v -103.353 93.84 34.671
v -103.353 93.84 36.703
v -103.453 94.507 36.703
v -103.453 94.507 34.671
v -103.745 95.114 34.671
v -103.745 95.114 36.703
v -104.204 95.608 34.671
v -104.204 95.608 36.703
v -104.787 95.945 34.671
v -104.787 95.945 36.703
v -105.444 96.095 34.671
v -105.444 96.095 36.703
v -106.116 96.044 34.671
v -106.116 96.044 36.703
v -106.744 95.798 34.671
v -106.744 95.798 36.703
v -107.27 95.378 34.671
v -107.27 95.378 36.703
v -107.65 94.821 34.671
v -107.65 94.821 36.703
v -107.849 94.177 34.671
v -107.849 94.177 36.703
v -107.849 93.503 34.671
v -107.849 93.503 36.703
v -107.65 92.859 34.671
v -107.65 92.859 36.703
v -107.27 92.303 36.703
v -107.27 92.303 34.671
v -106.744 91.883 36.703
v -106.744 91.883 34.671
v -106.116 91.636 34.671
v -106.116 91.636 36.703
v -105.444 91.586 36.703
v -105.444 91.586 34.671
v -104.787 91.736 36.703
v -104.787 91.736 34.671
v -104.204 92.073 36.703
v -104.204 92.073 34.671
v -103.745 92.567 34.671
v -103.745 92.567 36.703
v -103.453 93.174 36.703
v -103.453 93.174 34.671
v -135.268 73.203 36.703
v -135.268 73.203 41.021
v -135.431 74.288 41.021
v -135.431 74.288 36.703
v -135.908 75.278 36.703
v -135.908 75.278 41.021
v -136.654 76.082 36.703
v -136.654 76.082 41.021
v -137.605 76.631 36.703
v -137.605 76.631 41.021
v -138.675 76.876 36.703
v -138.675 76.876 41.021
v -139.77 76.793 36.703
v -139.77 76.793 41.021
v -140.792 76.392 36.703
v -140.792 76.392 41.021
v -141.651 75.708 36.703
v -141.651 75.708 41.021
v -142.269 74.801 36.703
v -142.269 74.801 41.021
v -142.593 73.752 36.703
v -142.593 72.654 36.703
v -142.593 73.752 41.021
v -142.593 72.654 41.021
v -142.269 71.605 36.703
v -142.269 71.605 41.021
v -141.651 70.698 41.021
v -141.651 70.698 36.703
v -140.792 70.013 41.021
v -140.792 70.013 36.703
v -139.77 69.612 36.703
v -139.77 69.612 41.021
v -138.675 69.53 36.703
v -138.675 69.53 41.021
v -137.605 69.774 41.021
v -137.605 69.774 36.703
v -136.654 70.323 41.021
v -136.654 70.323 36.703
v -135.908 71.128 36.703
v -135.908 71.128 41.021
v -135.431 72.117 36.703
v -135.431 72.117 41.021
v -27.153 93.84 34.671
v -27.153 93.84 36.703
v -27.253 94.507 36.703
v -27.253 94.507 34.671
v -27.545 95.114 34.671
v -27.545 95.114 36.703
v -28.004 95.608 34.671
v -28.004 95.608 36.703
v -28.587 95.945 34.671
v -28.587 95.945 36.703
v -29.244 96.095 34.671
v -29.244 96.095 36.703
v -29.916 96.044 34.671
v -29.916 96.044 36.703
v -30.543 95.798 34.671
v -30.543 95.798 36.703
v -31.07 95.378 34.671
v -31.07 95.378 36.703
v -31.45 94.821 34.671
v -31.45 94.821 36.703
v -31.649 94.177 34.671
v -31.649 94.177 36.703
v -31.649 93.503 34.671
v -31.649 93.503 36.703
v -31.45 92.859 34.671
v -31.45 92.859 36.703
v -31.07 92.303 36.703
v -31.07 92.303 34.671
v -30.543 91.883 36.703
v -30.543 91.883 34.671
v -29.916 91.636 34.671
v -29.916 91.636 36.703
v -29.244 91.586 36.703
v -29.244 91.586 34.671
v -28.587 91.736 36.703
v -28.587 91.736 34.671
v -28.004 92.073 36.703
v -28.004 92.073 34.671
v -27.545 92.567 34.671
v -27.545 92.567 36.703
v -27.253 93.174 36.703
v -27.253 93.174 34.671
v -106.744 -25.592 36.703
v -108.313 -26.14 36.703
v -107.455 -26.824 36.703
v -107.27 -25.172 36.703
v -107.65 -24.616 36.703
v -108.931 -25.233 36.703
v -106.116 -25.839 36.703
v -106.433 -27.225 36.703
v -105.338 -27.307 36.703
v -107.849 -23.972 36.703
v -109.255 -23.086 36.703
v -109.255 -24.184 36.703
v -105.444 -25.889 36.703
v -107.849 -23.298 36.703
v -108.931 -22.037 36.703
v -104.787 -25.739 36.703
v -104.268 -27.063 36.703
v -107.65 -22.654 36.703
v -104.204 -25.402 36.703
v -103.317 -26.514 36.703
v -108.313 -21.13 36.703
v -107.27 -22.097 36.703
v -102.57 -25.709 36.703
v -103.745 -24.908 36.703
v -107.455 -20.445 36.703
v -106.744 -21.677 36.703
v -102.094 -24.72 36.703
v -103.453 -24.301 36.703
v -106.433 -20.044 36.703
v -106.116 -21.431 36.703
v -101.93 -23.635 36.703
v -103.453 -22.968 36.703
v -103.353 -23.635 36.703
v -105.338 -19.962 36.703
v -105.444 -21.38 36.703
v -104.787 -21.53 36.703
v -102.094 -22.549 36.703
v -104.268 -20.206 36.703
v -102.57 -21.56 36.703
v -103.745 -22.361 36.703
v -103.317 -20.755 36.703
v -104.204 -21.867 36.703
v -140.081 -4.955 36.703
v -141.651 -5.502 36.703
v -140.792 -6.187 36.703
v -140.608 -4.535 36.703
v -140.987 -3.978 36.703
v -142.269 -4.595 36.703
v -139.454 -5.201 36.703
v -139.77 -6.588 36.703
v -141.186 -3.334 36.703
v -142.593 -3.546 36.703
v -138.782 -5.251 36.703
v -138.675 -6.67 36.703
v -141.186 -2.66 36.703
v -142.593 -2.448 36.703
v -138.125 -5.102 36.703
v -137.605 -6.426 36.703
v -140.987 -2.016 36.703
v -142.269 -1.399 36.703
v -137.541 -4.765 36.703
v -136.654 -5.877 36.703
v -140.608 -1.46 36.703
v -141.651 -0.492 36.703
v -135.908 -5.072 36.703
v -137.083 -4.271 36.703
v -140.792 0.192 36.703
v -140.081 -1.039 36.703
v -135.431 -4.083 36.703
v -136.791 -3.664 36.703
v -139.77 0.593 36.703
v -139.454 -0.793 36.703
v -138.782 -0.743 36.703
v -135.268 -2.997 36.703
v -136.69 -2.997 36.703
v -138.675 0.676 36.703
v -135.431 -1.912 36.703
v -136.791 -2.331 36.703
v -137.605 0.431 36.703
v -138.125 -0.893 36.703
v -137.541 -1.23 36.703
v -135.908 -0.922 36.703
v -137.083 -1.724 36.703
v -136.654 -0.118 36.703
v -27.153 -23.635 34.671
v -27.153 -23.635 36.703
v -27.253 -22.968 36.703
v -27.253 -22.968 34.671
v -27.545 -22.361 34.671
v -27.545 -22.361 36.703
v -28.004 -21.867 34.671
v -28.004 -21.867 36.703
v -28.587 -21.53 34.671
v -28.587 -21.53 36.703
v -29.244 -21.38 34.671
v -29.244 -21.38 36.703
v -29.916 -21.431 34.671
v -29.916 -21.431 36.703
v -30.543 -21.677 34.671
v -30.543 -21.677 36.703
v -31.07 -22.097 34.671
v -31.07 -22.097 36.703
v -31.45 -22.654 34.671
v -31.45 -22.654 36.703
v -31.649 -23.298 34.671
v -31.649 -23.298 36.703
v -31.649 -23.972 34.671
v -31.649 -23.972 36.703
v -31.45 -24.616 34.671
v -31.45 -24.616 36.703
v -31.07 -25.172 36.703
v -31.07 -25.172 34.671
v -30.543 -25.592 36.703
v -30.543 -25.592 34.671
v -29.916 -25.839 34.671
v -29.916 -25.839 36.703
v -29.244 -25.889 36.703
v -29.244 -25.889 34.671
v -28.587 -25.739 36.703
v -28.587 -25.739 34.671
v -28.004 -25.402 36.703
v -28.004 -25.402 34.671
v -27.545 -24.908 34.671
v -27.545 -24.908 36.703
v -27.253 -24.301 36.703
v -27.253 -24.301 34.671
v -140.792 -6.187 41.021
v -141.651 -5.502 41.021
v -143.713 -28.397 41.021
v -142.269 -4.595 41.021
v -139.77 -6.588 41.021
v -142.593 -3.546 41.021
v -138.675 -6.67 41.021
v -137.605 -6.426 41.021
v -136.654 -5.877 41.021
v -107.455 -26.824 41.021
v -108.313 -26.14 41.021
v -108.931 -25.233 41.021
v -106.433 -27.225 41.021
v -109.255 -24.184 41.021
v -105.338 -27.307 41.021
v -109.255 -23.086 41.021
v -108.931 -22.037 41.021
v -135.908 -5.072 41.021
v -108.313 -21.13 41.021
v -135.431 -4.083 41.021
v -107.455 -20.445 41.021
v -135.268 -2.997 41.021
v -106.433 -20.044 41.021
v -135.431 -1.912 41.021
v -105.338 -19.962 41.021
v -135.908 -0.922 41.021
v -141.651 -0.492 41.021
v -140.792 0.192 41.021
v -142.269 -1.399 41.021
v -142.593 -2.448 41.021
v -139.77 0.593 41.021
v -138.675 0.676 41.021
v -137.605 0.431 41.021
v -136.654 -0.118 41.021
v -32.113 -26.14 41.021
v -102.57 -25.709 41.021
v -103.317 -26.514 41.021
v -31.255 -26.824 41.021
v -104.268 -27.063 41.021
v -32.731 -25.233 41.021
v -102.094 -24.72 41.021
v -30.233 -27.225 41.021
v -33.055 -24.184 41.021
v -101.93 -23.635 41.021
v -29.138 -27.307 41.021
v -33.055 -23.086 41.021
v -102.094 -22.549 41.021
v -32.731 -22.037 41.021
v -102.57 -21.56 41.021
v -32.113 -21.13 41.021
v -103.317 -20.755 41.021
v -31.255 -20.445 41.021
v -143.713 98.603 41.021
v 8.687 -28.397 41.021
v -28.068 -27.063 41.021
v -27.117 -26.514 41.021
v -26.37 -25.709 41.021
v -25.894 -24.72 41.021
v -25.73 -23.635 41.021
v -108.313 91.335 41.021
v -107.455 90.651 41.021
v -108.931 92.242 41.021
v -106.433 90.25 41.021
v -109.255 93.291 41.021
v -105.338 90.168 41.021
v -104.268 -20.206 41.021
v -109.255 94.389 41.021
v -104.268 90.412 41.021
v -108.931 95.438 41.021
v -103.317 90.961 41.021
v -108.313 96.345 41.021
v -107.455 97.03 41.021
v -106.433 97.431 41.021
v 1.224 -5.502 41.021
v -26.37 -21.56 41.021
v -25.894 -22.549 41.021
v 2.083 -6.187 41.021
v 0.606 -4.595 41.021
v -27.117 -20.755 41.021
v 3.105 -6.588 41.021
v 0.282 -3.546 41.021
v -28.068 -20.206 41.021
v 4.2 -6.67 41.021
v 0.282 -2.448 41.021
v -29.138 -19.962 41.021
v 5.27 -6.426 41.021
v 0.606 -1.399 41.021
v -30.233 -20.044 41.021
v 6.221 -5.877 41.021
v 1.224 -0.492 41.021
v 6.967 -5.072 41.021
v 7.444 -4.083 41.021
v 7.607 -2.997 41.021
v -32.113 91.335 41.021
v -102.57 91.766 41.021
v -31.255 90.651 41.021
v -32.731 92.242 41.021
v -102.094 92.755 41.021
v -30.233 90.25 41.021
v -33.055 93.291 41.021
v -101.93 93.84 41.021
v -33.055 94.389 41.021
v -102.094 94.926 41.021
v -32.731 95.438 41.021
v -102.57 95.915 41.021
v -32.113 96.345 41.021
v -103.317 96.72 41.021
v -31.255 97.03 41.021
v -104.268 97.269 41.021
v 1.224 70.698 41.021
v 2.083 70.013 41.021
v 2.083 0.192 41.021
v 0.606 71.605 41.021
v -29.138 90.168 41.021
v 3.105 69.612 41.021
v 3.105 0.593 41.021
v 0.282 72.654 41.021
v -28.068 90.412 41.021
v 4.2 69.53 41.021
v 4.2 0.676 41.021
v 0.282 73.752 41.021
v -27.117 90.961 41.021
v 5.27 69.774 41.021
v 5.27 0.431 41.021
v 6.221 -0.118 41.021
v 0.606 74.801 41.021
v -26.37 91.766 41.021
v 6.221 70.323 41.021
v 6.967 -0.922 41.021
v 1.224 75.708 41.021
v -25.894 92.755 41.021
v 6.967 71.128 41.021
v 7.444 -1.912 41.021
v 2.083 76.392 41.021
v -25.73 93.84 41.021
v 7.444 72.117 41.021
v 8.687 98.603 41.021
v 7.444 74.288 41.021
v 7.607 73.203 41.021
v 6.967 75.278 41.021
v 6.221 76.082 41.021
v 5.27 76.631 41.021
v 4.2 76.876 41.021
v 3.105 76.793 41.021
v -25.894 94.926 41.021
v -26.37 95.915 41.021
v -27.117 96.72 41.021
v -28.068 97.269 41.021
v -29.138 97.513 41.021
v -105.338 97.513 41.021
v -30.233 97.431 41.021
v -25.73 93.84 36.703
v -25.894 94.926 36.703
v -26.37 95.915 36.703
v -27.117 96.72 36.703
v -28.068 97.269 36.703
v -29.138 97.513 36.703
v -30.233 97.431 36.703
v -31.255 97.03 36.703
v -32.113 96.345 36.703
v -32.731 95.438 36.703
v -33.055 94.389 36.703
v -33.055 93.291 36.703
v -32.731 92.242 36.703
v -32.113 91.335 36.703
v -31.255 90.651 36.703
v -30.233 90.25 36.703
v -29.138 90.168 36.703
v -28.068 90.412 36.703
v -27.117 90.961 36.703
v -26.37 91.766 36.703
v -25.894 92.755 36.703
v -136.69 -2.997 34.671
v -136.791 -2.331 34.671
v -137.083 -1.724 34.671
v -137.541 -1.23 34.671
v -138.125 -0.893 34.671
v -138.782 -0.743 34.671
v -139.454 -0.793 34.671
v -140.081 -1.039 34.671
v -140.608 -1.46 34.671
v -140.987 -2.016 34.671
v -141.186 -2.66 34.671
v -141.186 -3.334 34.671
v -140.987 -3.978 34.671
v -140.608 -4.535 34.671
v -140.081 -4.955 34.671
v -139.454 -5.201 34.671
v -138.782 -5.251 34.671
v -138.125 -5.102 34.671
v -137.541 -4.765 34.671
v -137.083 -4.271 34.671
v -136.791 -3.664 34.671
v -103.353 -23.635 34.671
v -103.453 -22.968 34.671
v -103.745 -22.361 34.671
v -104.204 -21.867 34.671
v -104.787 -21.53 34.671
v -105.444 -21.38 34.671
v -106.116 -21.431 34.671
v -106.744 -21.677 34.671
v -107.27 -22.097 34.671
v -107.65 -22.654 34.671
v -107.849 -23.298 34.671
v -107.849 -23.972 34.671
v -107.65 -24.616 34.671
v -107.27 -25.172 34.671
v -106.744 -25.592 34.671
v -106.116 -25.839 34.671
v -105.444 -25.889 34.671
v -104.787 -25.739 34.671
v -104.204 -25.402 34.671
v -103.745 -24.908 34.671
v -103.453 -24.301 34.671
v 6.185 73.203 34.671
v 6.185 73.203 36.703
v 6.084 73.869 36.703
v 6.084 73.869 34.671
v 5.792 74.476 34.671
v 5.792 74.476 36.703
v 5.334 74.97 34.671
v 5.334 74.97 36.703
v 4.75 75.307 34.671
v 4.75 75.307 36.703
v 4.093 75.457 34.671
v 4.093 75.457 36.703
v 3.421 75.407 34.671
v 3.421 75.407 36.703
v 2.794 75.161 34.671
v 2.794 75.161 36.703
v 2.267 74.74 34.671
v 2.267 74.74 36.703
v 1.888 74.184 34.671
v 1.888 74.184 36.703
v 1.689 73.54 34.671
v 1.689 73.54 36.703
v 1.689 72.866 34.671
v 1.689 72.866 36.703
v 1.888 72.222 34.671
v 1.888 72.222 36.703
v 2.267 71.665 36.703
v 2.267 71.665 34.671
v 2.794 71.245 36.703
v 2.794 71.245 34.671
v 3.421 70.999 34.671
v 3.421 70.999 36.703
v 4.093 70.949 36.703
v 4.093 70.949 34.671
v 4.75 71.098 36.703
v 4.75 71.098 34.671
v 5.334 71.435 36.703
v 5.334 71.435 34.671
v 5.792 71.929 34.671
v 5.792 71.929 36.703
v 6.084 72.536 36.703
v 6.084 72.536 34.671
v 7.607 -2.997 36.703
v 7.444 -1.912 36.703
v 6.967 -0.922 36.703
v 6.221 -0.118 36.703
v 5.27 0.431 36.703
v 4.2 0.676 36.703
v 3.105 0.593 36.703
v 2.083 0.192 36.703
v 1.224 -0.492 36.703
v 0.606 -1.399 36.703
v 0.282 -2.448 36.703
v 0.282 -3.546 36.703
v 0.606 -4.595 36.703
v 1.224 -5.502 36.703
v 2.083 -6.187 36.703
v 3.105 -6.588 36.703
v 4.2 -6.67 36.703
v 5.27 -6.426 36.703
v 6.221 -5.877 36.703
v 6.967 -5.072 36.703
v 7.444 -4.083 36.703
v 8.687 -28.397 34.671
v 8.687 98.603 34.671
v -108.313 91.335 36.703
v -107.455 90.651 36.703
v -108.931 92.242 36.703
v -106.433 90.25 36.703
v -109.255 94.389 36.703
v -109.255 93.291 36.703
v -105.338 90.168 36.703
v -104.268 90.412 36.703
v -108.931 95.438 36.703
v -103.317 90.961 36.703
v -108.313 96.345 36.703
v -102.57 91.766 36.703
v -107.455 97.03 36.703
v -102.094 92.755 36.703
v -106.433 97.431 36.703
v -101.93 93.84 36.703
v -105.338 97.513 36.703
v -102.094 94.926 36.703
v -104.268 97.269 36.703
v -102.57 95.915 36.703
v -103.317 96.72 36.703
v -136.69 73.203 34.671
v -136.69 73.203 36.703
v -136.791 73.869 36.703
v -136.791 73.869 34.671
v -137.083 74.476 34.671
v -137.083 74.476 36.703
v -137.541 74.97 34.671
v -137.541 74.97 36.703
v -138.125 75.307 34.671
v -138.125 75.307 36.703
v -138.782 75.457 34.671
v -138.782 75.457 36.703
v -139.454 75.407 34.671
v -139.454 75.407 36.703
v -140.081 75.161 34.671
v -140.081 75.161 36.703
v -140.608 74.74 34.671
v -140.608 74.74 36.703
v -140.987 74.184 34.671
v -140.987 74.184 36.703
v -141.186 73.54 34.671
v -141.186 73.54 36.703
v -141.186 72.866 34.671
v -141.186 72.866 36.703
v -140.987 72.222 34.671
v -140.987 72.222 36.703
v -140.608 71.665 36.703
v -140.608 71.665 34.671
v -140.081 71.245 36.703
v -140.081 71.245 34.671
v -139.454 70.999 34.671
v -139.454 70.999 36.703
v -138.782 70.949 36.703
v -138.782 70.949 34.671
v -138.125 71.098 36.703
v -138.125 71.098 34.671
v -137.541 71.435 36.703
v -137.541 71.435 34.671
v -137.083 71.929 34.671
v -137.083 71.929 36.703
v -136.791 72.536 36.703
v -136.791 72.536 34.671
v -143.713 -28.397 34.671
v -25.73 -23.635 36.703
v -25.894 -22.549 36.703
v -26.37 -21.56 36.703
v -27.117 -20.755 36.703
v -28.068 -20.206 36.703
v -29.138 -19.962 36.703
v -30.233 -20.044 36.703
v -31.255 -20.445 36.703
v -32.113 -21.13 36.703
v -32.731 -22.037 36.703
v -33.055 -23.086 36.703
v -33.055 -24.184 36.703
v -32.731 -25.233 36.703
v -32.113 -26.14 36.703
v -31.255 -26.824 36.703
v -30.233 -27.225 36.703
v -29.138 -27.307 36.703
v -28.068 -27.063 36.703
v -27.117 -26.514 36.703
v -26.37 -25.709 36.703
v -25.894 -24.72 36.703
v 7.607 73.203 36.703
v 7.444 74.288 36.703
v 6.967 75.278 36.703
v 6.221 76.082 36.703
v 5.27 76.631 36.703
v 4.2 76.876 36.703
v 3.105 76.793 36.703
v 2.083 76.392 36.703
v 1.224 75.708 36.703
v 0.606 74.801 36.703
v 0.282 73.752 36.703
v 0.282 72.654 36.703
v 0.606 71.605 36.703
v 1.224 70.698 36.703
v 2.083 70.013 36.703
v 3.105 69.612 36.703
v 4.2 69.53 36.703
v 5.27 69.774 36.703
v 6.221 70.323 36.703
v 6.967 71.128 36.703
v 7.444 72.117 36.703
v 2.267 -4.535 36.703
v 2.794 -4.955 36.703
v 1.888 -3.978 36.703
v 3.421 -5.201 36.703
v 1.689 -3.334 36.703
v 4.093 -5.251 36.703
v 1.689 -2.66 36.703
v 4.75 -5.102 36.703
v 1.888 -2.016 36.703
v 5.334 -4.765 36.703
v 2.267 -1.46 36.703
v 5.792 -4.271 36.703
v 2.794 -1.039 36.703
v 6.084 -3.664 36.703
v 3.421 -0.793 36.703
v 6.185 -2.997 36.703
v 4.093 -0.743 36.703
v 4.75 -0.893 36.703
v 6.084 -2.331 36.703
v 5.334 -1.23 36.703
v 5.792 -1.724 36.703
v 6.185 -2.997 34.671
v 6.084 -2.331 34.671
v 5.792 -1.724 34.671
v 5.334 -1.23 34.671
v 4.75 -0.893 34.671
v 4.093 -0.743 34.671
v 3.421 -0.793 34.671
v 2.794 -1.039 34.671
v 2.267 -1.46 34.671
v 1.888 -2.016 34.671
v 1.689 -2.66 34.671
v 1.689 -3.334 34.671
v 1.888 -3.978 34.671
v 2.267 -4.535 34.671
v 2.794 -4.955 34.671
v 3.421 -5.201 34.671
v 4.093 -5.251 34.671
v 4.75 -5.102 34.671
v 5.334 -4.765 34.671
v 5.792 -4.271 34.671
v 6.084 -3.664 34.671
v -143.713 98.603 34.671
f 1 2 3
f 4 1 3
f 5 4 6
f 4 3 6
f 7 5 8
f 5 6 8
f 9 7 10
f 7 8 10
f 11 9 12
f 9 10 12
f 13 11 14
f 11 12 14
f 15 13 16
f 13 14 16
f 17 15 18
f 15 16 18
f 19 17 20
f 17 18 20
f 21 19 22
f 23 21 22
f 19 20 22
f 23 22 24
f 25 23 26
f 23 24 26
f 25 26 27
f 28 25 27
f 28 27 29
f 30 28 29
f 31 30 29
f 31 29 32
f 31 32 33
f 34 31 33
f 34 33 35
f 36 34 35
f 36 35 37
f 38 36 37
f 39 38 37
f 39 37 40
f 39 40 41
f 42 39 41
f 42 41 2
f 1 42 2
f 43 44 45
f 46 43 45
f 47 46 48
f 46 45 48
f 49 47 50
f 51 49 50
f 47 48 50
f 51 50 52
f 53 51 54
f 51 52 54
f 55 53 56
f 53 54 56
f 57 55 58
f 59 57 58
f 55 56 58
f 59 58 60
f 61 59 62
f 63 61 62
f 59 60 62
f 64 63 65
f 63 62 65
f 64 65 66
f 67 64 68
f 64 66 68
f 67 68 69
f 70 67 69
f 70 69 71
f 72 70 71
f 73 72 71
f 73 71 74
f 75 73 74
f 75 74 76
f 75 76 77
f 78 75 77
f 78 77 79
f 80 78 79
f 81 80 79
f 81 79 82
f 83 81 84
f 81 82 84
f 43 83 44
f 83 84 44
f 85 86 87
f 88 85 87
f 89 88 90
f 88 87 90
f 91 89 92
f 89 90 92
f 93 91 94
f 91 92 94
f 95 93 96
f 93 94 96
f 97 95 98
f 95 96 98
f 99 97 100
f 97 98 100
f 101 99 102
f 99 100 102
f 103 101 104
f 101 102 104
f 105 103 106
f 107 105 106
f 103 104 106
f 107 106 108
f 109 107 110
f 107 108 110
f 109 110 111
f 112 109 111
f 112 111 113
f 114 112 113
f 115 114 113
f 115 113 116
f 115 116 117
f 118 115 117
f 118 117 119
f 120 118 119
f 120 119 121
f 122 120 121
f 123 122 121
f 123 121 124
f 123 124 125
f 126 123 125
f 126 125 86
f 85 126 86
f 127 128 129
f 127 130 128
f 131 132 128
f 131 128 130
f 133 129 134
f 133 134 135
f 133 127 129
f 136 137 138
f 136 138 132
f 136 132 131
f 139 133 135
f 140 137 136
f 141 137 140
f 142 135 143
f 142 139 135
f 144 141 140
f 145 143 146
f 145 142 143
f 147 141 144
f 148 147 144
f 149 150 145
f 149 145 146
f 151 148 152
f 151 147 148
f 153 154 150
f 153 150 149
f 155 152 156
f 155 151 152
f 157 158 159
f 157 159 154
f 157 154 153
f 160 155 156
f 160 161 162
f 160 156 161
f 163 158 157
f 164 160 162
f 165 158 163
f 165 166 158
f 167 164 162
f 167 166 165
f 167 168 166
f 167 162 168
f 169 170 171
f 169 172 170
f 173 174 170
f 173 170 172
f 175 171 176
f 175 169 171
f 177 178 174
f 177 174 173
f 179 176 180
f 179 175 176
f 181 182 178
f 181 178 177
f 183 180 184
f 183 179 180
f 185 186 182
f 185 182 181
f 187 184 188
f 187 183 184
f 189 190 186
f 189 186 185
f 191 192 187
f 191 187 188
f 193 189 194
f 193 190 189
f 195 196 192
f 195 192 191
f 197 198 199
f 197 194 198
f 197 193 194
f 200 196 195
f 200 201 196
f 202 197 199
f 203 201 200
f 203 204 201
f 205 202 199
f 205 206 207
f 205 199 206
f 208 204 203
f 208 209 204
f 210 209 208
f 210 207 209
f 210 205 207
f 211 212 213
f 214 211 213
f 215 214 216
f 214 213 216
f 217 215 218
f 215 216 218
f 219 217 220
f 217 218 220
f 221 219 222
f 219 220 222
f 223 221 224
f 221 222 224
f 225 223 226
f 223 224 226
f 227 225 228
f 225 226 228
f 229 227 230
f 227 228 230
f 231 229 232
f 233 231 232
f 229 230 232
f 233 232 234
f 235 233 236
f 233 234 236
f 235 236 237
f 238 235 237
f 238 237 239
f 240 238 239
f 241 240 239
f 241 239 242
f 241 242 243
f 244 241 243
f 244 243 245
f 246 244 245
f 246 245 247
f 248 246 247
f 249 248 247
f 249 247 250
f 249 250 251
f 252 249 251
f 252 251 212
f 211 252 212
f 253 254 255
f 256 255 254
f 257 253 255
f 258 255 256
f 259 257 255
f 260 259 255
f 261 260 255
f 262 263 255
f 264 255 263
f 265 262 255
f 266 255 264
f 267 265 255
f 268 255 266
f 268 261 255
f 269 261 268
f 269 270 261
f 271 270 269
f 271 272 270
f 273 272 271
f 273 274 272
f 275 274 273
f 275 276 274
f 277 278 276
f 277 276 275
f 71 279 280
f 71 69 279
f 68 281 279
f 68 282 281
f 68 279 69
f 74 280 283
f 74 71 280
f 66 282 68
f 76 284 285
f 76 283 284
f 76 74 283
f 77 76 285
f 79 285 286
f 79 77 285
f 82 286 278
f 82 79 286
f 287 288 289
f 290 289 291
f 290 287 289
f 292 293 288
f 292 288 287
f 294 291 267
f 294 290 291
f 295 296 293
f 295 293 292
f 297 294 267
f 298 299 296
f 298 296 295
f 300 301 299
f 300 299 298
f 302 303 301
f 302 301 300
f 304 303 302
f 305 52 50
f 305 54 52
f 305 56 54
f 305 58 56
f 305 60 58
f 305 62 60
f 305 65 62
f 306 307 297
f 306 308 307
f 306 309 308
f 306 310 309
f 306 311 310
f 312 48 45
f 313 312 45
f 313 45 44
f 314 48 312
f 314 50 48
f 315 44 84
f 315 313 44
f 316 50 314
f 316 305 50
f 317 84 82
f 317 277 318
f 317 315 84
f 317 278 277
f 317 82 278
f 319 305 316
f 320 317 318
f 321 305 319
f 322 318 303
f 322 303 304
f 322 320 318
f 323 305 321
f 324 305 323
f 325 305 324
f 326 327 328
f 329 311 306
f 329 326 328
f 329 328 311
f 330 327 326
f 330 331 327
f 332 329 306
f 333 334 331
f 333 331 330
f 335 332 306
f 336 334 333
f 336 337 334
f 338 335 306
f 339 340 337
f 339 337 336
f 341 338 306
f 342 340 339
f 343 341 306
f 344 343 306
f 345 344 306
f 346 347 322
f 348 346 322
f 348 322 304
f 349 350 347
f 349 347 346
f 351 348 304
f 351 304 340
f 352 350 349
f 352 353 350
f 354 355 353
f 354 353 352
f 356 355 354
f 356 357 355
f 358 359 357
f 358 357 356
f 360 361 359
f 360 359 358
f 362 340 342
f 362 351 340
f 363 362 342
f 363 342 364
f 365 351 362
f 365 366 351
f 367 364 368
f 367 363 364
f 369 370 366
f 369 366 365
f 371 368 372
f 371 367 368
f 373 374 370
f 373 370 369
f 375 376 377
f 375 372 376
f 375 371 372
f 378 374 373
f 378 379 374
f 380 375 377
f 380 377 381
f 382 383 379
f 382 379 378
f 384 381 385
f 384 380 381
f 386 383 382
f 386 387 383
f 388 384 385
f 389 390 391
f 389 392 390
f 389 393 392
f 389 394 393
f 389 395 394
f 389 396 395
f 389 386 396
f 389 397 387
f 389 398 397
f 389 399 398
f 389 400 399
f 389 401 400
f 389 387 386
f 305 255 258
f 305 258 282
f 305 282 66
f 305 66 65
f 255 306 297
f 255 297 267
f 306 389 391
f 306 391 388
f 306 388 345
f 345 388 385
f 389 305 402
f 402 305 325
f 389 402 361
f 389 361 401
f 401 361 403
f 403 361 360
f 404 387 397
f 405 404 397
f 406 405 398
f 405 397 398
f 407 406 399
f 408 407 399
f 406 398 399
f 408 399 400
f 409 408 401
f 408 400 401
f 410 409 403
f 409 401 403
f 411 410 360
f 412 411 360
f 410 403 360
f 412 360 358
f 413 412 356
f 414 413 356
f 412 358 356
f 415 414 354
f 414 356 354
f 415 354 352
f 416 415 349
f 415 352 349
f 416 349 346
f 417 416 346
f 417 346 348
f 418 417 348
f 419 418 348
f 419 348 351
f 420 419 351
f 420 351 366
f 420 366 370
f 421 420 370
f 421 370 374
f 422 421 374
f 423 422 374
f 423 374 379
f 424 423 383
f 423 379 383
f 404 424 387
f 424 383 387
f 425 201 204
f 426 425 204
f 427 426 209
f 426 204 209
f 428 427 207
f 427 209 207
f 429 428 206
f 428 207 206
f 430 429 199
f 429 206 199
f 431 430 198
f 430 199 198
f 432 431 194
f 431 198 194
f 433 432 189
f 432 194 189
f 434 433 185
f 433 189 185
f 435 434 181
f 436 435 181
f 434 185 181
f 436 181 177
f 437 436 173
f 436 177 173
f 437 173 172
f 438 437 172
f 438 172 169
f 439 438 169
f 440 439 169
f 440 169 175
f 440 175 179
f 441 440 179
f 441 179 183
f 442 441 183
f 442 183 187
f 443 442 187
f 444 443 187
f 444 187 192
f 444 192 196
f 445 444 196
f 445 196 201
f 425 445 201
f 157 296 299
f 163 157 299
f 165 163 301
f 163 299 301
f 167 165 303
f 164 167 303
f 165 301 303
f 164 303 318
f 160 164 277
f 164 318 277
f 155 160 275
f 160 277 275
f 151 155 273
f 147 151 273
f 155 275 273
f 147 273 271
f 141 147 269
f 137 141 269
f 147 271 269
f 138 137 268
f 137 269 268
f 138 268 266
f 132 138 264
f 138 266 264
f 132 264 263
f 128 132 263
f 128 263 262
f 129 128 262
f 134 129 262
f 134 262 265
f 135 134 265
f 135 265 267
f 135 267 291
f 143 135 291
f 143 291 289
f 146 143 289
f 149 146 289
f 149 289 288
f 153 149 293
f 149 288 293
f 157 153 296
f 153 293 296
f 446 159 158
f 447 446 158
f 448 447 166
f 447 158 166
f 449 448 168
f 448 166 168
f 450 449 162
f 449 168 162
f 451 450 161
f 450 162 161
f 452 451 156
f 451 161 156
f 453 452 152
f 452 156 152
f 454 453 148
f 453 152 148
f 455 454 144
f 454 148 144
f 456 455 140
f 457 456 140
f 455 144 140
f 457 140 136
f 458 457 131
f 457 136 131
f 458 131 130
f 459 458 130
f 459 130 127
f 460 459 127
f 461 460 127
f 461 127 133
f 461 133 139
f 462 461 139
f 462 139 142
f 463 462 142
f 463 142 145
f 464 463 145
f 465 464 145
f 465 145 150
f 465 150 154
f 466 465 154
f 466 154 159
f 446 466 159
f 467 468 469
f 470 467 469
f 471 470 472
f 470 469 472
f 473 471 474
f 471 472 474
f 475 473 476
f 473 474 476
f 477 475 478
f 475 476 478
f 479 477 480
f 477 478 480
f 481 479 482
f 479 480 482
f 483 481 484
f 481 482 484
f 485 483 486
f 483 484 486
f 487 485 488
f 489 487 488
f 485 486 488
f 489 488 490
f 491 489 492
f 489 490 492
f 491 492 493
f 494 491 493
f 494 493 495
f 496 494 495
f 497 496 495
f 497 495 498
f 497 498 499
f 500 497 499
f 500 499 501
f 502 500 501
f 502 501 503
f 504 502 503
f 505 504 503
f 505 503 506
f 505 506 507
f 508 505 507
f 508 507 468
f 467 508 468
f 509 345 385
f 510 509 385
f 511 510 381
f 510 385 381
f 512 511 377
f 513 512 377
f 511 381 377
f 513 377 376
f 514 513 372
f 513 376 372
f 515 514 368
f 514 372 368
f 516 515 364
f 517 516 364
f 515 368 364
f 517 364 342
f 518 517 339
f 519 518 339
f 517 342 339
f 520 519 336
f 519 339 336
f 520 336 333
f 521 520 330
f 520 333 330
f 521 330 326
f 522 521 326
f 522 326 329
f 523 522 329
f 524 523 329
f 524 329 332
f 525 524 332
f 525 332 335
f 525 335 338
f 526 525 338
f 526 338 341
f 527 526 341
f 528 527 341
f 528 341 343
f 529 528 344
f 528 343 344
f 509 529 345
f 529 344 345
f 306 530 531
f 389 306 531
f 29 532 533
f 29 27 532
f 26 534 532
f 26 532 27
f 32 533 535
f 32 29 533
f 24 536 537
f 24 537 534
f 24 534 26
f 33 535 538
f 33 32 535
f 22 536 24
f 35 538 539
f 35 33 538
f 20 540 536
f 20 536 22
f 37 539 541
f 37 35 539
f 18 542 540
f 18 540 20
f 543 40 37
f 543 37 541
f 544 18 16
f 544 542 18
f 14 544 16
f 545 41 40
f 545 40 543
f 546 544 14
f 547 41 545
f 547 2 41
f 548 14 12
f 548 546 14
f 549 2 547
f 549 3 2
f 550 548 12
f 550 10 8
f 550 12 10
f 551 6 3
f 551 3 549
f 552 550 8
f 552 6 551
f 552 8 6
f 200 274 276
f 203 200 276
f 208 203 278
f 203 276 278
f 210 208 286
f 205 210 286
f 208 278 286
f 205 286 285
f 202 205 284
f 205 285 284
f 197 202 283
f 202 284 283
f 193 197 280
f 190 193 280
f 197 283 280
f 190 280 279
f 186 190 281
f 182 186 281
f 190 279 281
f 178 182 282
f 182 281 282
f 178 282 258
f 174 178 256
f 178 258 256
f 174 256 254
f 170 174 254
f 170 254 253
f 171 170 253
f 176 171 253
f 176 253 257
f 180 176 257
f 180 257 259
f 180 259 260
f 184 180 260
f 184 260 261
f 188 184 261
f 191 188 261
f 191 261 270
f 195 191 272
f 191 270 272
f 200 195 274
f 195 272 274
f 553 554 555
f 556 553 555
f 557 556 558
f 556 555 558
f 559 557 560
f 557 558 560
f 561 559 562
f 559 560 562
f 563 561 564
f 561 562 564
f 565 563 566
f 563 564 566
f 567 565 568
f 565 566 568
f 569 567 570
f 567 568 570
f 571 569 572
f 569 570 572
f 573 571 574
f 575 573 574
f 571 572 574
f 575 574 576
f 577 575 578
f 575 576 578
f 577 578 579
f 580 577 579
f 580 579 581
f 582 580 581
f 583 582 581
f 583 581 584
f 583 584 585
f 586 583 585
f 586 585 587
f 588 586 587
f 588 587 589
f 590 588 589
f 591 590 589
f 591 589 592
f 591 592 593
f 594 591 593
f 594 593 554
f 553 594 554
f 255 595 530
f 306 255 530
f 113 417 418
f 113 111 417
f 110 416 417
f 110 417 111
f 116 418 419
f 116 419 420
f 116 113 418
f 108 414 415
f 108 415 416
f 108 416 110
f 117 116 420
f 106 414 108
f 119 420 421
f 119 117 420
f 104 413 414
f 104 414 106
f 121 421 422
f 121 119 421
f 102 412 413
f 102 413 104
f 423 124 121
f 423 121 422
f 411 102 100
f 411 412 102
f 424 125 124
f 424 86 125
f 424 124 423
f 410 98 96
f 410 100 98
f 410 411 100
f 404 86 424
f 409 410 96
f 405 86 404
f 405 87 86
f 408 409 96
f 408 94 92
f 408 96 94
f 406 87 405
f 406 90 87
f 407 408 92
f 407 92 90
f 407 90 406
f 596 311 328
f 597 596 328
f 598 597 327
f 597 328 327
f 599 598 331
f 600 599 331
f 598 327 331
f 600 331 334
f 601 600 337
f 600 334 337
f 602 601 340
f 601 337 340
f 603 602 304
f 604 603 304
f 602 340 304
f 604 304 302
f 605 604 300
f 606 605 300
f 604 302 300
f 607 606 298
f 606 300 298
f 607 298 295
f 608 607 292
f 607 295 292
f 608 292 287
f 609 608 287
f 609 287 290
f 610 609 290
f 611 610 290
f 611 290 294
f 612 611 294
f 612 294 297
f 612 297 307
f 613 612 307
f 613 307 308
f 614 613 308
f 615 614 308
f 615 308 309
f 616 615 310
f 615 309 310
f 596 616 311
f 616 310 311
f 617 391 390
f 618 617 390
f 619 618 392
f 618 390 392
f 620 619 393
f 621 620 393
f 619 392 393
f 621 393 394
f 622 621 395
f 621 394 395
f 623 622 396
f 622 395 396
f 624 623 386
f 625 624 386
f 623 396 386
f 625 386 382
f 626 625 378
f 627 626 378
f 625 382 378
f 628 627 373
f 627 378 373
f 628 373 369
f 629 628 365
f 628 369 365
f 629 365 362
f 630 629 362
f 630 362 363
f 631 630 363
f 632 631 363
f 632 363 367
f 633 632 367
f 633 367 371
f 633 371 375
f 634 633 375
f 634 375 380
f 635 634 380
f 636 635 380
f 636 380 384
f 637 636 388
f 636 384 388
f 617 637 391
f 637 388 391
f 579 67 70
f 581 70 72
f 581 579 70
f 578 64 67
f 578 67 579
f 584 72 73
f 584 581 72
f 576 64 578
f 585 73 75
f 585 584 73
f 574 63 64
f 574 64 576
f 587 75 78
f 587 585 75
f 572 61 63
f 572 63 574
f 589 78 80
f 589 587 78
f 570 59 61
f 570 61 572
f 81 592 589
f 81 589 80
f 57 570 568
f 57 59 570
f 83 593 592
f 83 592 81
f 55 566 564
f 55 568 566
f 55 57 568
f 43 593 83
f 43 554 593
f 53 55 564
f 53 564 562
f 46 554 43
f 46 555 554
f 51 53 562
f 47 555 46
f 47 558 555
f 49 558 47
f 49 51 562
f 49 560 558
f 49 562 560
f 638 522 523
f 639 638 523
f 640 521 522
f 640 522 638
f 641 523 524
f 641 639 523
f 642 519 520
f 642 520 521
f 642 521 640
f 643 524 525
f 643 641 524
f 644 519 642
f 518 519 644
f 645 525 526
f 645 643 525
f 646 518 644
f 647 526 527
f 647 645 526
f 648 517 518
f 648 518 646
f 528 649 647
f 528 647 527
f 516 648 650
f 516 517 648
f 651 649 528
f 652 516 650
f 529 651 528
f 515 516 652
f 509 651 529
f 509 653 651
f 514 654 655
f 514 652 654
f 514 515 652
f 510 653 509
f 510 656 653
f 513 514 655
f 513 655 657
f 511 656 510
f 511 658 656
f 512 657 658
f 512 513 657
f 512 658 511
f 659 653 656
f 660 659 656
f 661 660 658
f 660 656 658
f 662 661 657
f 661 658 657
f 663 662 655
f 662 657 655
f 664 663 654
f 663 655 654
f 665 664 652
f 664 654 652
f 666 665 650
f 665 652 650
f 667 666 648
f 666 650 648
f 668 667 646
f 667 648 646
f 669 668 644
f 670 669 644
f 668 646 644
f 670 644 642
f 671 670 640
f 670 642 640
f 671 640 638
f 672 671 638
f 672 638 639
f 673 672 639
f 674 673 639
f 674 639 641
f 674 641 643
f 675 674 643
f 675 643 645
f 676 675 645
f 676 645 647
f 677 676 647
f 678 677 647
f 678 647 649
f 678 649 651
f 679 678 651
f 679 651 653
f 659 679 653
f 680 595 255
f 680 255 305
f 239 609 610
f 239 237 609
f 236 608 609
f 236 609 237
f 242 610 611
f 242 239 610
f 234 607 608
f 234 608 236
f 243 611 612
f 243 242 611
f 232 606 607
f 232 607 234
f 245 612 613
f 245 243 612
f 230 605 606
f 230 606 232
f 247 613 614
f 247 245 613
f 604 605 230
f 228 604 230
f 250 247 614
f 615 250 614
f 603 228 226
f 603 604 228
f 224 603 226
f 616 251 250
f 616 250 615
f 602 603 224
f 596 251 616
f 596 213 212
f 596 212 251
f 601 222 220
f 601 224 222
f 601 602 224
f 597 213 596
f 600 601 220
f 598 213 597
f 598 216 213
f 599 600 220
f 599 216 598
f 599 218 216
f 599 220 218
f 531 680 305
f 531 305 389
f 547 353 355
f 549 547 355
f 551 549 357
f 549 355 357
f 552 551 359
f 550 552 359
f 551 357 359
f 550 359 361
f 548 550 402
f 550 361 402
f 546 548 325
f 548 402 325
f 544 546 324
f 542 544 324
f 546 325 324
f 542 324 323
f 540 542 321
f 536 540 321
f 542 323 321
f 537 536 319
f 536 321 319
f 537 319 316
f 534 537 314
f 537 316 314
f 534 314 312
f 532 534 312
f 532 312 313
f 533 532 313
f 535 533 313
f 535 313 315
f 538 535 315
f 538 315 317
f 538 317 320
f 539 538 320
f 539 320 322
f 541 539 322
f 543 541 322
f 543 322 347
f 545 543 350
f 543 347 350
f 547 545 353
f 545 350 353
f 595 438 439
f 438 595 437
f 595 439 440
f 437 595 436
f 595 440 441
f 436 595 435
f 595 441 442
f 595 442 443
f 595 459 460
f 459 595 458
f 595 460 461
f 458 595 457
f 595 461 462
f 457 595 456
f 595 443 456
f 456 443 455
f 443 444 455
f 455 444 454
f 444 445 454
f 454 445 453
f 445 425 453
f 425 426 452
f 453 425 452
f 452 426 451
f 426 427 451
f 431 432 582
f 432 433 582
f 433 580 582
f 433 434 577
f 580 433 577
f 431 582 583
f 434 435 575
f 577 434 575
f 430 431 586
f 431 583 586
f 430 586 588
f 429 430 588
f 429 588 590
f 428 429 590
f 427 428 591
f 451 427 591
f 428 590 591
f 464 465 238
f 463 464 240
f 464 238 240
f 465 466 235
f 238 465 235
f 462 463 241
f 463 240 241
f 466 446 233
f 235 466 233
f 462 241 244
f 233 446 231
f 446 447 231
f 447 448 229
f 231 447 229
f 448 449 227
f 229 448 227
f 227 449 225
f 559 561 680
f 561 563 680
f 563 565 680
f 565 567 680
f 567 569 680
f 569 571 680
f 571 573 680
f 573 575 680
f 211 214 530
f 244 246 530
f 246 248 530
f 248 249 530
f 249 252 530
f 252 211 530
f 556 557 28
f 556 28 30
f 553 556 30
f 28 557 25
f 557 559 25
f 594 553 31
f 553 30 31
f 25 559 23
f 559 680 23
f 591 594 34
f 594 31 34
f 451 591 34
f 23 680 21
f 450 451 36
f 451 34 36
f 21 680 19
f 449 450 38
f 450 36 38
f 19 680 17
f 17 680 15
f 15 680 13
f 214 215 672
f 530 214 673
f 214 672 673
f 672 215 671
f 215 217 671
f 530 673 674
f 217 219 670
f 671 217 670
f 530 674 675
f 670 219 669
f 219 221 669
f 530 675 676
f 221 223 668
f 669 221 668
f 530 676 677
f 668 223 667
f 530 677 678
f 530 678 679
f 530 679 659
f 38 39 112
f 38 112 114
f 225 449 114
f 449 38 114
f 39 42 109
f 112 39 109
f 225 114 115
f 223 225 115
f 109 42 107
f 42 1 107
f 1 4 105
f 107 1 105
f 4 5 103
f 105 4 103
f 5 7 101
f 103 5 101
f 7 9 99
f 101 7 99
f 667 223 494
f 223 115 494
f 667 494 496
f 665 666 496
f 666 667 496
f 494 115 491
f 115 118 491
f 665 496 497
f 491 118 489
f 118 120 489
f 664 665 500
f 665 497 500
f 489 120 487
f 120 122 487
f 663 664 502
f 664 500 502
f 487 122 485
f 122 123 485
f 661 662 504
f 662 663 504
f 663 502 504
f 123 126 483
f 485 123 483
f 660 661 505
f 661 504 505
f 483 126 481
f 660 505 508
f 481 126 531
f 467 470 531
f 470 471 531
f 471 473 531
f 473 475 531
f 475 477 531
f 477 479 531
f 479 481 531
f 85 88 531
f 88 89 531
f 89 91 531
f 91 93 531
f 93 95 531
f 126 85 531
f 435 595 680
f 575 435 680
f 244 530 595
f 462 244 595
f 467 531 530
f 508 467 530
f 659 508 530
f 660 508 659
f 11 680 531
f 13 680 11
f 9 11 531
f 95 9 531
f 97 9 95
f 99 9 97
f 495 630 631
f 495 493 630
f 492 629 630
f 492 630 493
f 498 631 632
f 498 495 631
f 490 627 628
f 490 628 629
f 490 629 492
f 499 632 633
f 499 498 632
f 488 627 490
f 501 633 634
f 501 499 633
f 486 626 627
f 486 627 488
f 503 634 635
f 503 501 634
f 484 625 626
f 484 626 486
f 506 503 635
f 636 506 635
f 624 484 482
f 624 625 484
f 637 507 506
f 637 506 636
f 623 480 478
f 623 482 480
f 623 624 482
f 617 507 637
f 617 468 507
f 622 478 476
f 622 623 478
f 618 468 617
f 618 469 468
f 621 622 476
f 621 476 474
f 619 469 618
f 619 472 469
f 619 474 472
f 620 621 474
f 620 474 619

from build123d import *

# Parameters (mm, degrees)
SKETCH007_W     = 152.4
SKETCH007_H     = 127
PAD005_DEPTH    = 6.35
SKETCH085_R     = 2.2606
POCKET013_DEPTH = 6.351
SKETCH095_R     = 3.683
POCKET023_DEPTH = 4.318


with BuildPart() as part:
    # Sketch007 → Pad005 (new body)
    with BuildSketch(Plane.XY):
        Rectangle(SKETCH007_W, SKETCH007_H)
    extrude(amount=PAD005_DEPTH)

    # Sketch085 (on Face6 of Pad005) → Pocket013 (cut, through all)
    with BuildSketch(Plane.XY.offset(6.35)):
        with Locations((-38.1, 58.7375)):
            Circle(SKETCH085_R)
        with Locations((38.1, 58.7375)):
            Circle(SKETCH085_R)
        with Locations((71.4375, 38.1)):
            Circle(SKETCH085_R)
        with Locations((71.4375, -38.1)):
            Circle(SKETCH085_R)
        with Locations((38.1, -58.7375)):
            Circle(SKETCH085_R)
        with Locations((-38.1, -58.7375)):
            Circle(SKETCH085_R)
        with Locations((-71.4375, -38.1)):
            Circle(SKETCH085_R)
        with Locations((-71.4375, 38.1)):
            Circle(SKETCH085_R)
    extrude(amount=-POCKET013_DEPTH, mode=Mode.SUBTRACT)

    # Sketch095 (on Face6 of Pad005) → Pocket023 (cut)
    with BuildSketch(Plane.XY.offset(6.35)):
        with Locations((-38.1, 58.7375)):
            Circle(SKETCH095_R)
        with Locations((38.1, 58.7375)):
            Circle(SKETCH095_R)
        with Locations((71.4375, 38.1)):
            Circle(SKETCH095_R)
        with Locations((71.4375, -38.1)):
            Circle(SKETCH095_R)
        with Locations((38.1, -58.7375)):
            Circle(SKETCH095_R)
        with Locations((-38.1, -58.7375)):
            Circle(SKETCH095_R)
        with Locations((-71.4375, -38.1)):
            Circle(SKETCH095_R)
        with Locations((-71.4375, 38.1)):
            Circle(SKETCH095_R)
    extrude(amount=-POCKET023_DEPTH, mode=Mode.SUBTRACT)


with BuildPart() as part_1:
    # Body007 placement: moved
    add(part.part.moved(Location((-67.5132, 35.1028, 34.671))))


solid = part_1.part
